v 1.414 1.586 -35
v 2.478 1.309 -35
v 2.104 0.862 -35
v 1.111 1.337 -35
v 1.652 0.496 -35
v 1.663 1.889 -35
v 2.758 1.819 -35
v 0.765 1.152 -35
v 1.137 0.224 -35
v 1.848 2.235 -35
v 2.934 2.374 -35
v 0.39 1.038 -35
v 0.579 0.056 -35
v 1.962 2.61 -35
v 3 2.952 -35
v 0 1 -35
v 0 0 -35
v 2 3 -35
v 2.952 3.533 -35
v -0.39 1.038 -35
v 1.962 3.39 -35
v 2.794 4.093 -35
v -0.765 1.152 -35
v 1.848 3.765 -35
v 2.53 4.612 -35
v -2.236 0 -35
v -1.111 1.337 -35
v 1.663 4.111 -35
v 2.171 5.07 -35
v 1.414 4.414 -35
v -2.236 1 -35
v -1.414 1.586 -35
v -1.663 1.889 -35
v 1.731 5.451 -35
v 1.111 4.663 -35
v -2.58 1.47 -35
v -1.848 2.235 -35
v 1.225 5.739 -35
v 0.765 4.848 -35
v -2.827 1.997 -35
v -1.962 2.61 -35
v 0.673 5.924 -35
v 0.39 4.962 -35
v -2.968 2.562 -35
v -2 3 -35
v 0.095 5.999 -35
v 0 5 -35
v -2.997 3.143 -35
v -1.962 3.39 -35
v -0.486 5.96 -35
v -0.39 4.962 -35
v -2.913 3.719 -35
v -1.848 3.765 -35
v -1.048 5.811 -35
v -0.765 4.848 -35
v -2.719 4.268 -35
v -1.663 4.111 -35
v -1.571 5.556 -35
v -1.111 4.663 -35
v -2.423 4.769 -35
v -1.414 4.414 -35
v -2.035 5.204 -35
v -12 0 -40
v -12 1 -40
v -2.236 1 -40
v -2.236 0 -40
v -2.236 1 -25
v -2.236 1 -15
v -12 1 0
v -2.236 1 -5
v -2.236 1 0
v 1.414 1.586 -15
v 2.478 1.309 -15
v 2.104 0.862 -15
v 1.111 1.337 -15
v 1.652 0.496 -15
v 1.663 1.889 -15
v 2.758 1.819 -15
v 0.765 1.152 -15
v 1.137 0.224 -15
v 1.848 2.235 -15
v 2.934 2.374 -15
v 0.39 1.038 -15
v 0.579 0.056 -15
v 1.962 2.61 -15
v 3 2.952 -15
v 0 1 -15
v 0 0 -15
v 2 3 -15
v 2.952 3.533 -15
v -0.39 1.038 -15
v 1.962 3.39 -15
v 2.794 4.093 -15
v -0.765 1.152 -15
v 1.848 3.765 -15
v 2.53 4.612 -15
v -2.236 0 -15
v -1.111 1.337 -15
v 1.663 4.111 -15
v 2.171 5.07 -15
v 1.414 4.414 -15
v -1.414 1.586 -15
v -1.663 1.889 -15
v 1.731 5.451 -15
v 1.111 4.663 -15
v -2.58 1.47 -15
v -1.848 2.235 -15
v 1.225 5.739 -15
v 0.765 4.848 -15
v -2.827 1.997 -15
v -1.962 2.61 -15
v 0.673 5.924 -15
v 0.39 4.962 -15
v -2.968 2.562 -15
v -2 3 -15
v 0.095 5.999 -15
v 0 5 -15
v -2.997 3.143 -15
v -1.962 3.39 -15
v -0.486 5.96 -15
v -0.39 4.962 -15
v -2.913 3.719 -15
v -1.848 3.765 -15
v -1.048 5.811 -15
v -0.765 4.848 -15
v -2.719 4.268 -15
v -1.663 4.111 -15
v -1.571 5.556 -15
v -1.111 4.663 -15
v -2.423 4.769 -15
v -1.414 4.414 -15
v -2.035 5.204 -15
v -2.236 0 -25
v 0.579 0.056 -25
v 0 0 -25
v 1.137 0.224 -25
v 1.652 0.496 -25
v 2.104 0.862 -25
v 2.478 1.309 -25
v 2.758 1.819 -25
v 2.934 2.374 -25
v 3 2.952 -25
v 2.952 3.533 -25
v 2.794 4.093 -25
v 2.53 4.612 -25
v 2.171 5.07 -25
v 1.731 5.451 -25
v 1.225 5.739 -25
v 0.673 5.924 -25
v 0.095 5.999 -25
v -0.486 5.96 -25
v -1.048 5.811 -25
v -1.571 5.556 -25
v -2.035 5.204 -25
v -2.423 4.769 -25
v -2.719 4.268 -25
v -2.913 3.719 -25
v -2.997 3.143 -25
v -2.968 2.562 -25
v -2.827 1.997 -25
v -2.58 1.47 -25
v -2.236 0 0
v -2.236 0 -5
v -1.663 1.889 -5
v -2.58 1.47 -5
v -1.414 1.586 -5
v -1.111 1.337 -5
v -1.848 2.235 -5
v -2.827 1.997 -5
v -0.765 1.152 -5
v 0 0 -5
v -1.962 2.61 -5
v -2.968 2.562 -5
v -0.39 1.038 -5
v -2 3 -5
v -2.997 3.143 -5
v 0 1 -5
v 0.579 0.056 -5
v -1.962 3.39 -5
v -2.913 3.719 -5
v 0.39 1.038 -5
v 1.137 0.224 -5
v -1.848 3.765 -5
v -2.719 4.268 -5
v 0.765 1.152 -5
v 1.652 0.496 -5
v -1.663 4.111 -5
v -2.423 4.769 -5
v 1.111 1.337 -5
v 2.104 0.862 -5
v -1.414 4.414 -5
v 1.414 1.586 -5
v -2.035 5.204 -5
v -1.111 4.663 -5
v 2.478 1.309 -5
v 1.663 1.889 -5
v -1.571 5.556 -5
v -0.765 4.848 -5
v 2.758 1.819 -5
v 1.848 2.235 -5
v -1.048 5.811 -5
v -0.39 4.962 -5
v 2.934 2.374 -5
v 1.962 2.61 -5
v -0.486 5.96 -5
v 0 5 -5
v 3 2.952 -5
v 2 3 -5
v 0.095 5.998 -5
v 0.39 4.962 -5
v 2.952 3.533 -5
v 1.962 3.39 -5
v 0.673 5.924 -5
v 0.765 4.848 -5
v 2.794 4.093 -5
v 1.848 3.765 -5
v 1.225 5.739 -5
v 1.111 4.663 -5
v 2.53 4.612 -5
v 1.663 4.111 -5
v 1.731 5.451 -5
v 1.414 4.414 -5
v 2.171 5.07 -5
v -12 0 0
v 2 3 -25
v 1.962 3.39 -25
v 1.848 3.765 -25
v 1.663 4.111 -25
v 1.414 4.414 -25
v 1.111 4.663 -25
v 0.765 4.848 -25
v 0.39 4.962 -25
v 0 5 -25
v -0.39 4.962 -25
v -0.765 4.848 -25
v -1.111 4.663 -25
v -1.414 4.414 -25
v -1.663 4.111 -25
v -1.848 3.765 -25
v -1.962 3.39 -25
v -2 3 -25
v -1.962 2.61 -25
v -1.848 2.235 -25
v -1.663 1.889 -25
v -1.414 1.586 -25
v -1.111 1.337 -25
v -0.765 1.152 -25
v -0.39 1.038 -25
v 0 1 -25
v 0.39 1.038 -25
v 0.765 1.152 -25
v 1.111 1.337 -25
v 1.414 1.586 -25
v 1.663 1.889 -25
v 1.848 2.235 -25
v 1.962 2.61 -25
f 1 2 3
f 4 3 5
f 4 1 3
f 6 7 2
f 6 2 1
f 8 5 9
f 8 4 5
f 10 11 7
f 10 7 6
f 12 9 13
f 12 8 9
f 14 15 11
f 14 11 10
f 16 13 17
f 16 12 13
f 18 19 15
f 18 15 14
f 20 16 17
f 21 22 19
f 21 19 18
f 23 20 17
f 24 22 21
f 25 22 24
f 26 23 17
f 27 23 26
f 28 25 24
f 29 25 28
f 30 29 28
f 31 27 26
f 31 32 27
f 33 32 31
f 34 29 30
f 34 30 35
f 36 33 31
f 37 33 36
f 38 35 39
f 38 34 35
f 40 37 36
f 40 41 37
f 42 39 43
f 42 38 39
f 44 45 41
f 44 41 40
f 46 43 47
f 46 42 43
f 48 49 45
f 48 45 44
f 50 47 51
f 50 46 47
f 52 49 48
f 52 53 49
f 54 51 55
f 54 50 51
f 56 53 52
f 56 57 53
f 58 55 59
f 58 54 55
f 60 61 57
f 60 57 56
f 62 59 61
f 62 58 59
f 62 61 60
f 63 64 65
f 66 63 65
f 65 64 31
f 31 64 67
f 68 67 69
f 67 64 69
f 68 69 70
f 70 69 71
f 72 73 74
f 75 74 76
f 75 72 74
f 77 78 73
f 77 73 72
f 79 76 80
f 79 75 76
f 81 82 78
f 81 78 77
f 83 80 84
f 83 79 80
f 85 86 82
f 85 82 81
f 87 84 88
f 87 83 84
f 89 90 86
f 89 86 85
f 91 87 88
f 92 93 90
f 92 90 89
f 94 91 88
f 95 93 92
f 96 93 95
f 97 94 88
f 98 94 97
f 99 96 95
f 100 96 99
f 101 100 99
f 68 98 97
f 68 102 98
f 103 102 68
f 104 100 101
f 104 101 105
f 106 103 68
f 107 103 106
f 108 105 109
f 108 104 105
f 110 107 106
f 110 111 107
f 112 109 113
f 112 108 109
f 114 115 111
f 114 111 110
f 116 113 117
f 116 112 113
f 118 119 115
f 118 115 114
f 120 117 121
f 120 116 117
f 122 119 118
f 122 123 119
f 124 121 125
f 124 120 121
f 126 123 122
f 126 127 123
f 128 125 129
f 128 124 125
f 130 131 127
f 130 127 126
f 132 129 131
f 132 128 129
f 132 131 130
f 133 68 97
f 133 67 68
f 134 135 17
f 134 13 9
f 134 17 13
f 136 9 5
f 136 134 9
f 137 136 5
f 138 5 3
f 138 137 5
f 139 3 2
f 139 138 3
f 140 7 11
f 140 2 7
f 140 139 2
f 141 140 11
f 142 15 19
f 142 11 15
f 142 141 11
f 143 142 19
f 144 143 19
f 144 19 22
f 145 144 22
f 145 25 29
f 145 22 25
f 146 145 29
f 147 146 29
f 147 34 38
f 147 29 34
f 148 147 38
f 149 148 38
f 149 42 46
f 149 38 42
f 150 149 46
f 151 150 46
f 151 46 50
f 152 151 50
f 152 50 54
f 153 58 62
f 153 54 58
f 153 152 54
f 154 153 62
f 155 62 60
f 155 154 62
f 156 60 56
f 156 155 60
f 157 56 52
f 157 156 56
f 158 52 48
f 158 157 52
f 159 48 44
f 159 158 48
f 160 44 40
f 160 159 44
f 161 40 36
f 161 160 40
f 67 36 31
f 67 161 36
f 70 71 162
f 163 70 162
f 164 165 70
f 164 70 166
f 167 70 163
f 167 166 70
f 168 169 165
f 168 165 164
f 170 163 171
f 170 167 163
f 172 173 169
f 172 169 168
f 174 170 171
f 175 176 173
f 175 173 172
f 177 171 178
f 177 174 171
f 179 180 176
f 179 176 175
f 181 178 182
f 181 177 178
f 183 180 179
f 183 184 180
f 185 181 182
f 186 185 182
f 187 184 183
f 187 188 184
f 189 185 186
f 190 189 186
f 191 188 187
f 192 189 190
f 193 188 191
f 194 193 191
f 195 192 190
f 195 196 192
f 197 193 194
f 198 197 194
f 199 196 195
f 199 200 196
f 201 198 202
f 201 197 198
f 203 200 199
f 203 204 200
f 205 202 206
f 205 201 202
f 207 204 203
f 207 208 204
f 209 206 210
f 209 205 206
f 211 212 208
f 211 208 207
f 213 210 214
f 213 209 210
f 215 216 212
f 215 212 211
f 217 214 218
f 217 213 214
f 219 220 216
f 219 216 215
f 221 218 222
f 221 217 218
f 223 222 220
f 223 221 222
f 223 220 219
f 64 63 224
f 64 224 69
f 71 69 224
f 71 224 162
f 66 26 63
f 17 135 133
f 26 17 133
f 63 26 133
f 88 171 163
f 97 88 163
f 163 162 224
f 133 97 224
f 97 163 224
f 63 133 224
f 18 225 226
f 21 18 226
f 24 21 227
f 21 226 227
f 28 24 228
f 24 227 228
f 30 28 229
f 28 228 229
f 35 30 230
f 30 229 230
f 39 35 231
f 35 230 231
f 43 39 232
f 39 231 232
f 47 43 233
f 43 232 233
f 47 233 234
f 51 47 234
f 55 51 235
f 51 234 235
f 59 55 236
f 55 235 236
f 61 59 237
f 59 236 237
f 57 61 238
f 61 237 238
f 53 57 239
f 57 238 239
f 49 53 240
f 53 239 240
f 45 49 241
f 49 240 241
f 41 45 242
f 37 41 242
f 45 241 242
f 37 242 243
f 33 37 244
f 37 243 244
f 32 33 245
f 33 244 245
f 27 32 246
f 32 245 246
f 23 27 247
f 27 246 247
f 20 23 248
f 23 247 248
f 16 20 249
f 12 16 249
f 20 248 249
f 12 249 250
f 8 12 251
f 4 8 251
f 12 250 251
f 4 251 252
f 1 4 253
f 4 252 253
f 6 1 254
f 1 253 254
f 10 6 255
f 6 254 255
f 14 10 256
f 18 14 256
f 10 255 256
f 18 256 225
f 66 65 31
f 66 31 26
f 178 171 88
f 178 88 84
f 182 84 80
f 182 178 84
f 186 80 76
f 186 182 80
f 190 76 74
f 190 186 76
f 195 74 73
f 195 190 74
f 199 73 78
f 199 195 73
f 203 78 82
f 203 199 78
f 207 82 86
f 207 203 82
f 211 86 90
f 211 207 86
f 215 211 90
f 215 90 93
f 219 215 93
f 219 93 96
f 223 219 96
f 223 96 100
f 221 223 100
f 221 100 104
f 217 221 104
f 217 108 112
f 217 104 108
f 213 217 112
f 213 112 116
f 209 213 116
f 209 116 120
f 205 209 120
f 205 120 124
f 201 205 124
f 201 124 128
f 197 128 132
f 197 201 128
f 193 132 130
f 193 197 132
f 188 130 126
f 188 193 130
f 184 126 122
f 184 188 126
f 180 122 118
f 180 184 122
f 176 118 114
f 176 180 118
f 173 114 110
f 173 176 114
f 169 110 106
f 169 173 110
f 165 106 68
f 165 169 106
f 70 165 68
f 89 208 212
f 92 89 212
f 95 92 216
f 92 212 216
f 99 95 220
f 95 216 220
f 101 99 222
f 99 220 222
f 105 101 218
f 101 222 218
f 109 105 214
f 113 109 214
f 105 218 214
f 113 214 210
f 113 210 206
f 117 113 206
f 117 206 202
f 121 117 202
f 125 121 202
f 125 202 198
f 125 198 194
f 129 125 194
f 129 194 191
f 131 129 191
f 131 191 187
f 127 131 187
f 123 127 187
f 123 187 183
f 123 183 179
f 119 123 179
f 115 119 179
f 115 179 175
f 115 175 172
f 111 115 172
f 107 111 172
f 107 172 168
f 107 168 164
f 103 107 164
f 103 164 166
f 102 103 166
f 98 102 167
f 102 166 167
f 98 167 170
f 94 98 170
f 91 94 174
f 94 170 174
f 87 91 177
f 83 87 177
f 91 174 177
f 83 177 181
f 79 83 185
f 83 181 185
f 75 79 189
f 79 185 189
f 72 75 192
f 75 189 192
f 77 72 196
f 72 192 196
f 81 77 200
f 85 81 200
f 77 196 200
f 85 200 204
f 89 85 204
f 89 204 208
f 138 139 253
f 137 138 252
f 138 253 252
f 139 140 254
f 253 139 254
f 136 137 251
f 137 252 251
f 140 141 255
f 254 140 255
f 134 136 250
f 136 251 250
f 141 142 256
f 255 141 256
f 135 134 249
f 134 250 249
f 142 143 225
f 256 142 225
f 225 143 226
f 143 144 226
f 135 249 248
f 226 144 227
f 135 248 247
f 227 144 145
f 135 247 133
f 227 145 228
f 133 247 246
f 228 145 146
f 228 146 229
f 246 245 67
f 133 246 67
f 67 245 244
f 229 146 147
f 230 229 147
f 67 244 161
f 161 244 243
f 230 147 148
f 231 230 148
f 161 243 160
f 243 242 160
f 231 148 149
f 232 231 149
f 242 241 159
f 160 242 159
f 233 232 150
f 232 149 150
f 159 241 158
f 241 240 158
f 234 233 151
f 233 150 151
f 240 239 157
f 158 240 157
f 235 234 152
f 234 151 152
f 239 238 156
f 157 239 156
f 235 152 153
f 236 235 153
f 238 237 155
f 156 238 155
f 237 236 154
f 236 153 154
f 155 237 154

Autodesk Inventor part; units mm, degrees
ref_plane "YZ Plane" through (0, 0, 0) normal (1, 0, 0) x (0, 1, 0)
ref_plane "XZ Plane" through (0, 0, 0) normal (0, 1, 0) x (-1, 0, 0)
sketch "Sketch1" plane through (0, 0, 0) normal (0, 0, 1) x (1, 0, 0)
  line L0 (0, 0) -> (-12, 0)
  line L1 (-12, 0) -> (-12, 1)
  line L2 (-12, 1) -> (-2.2361, 1)
  arc A0 (0, 0) -> (-2.2361, 1) centre (0, 3) ccw
  circle A1 centre (0, 3) radius 2
  dimension "d1" = 1
  dimension "d2" = 4
  dimension "d3" = 12
  dimension "d4" = 3
  dimension "d5" = 1
  dimension "d6" = 3
extrude "Extrusion1" add sketch "Sketch1" against normal blind 40
sketch "Sketch2" plane through (0, 0, 0) normal (0, 0, 1) x (1, 0, 0)
  arc A0 (0, 0) -> (-2.2361, 1) centre (0, 3) ccw projected
  arc A1 (0, 0) -> (-2.2361, 1) centre (0, 3) ccw projected
  circle A2 centre (0, 3) radius 2 projected
  circle A3 centre (0, 3) radius 2 projected
  line L0 (-2.2361, 1) -> (-2.2361, 0)
  line L1 (-12, 0) -> (0, 0) projected
  line L2 (-2.2361, 0) -> (0, 0)
extrude "Extrusion2" cut sketch "Sketch2" against normal blind 5
sketch "Sketch3" plane through (0, 0, -40) normal (0, 0, -1) x (-1, 0, 0)
  arc A0 (2.2361, 1) -> (0, 0) centre (0, 3) ccw projected
  arc A1 (2.2361, 1) -> (0, 0) centre (0, 3) ccw projected
  circle A2 centre (0, 3) radius 2 projected
  circle A3 centre (0, 3) radius 2 projected
  line L0 (12, 1) -> (2.2361, 1) projected
  line L1 (2.2361, 1) -> (2.2361, 0)
  line L2 (0, 0) -> (12, 0) projected
  line L3 (2.2361, 0) -> (0, 0)
extrude "Extrusion3" cut sketch "Sketch3" against normal blind 5
ref_plane "Work Plane1" through (0, 0, -25) normal (0, 0, -1) x (-1, 0, 0)
sketch "Sketch4" plane through (0, 0, -25) normal (0, 0, -1) x (-1, 0, 0)
  arc A0 (2.2361, 1) -> (0, 0) centre (0, 3) ccw projected
  arc A1 (2.2361, 1) -> (0, 0) centre (0, 3) ccw projected
  circle A2 centre (0, 3) radius 2 projected
  circle A3 centre (0, 3) radius 2 projected
  line L0 (2.2361, 1) -> (2.2361, 0)
  line L1 (2.2361, 0) -> (0, 0)
  point P0 (0, 0)
extrude "Extrusion4" cut sketch "Sketch4" against normal blind 10
properties part number "Poker hinge 2"
